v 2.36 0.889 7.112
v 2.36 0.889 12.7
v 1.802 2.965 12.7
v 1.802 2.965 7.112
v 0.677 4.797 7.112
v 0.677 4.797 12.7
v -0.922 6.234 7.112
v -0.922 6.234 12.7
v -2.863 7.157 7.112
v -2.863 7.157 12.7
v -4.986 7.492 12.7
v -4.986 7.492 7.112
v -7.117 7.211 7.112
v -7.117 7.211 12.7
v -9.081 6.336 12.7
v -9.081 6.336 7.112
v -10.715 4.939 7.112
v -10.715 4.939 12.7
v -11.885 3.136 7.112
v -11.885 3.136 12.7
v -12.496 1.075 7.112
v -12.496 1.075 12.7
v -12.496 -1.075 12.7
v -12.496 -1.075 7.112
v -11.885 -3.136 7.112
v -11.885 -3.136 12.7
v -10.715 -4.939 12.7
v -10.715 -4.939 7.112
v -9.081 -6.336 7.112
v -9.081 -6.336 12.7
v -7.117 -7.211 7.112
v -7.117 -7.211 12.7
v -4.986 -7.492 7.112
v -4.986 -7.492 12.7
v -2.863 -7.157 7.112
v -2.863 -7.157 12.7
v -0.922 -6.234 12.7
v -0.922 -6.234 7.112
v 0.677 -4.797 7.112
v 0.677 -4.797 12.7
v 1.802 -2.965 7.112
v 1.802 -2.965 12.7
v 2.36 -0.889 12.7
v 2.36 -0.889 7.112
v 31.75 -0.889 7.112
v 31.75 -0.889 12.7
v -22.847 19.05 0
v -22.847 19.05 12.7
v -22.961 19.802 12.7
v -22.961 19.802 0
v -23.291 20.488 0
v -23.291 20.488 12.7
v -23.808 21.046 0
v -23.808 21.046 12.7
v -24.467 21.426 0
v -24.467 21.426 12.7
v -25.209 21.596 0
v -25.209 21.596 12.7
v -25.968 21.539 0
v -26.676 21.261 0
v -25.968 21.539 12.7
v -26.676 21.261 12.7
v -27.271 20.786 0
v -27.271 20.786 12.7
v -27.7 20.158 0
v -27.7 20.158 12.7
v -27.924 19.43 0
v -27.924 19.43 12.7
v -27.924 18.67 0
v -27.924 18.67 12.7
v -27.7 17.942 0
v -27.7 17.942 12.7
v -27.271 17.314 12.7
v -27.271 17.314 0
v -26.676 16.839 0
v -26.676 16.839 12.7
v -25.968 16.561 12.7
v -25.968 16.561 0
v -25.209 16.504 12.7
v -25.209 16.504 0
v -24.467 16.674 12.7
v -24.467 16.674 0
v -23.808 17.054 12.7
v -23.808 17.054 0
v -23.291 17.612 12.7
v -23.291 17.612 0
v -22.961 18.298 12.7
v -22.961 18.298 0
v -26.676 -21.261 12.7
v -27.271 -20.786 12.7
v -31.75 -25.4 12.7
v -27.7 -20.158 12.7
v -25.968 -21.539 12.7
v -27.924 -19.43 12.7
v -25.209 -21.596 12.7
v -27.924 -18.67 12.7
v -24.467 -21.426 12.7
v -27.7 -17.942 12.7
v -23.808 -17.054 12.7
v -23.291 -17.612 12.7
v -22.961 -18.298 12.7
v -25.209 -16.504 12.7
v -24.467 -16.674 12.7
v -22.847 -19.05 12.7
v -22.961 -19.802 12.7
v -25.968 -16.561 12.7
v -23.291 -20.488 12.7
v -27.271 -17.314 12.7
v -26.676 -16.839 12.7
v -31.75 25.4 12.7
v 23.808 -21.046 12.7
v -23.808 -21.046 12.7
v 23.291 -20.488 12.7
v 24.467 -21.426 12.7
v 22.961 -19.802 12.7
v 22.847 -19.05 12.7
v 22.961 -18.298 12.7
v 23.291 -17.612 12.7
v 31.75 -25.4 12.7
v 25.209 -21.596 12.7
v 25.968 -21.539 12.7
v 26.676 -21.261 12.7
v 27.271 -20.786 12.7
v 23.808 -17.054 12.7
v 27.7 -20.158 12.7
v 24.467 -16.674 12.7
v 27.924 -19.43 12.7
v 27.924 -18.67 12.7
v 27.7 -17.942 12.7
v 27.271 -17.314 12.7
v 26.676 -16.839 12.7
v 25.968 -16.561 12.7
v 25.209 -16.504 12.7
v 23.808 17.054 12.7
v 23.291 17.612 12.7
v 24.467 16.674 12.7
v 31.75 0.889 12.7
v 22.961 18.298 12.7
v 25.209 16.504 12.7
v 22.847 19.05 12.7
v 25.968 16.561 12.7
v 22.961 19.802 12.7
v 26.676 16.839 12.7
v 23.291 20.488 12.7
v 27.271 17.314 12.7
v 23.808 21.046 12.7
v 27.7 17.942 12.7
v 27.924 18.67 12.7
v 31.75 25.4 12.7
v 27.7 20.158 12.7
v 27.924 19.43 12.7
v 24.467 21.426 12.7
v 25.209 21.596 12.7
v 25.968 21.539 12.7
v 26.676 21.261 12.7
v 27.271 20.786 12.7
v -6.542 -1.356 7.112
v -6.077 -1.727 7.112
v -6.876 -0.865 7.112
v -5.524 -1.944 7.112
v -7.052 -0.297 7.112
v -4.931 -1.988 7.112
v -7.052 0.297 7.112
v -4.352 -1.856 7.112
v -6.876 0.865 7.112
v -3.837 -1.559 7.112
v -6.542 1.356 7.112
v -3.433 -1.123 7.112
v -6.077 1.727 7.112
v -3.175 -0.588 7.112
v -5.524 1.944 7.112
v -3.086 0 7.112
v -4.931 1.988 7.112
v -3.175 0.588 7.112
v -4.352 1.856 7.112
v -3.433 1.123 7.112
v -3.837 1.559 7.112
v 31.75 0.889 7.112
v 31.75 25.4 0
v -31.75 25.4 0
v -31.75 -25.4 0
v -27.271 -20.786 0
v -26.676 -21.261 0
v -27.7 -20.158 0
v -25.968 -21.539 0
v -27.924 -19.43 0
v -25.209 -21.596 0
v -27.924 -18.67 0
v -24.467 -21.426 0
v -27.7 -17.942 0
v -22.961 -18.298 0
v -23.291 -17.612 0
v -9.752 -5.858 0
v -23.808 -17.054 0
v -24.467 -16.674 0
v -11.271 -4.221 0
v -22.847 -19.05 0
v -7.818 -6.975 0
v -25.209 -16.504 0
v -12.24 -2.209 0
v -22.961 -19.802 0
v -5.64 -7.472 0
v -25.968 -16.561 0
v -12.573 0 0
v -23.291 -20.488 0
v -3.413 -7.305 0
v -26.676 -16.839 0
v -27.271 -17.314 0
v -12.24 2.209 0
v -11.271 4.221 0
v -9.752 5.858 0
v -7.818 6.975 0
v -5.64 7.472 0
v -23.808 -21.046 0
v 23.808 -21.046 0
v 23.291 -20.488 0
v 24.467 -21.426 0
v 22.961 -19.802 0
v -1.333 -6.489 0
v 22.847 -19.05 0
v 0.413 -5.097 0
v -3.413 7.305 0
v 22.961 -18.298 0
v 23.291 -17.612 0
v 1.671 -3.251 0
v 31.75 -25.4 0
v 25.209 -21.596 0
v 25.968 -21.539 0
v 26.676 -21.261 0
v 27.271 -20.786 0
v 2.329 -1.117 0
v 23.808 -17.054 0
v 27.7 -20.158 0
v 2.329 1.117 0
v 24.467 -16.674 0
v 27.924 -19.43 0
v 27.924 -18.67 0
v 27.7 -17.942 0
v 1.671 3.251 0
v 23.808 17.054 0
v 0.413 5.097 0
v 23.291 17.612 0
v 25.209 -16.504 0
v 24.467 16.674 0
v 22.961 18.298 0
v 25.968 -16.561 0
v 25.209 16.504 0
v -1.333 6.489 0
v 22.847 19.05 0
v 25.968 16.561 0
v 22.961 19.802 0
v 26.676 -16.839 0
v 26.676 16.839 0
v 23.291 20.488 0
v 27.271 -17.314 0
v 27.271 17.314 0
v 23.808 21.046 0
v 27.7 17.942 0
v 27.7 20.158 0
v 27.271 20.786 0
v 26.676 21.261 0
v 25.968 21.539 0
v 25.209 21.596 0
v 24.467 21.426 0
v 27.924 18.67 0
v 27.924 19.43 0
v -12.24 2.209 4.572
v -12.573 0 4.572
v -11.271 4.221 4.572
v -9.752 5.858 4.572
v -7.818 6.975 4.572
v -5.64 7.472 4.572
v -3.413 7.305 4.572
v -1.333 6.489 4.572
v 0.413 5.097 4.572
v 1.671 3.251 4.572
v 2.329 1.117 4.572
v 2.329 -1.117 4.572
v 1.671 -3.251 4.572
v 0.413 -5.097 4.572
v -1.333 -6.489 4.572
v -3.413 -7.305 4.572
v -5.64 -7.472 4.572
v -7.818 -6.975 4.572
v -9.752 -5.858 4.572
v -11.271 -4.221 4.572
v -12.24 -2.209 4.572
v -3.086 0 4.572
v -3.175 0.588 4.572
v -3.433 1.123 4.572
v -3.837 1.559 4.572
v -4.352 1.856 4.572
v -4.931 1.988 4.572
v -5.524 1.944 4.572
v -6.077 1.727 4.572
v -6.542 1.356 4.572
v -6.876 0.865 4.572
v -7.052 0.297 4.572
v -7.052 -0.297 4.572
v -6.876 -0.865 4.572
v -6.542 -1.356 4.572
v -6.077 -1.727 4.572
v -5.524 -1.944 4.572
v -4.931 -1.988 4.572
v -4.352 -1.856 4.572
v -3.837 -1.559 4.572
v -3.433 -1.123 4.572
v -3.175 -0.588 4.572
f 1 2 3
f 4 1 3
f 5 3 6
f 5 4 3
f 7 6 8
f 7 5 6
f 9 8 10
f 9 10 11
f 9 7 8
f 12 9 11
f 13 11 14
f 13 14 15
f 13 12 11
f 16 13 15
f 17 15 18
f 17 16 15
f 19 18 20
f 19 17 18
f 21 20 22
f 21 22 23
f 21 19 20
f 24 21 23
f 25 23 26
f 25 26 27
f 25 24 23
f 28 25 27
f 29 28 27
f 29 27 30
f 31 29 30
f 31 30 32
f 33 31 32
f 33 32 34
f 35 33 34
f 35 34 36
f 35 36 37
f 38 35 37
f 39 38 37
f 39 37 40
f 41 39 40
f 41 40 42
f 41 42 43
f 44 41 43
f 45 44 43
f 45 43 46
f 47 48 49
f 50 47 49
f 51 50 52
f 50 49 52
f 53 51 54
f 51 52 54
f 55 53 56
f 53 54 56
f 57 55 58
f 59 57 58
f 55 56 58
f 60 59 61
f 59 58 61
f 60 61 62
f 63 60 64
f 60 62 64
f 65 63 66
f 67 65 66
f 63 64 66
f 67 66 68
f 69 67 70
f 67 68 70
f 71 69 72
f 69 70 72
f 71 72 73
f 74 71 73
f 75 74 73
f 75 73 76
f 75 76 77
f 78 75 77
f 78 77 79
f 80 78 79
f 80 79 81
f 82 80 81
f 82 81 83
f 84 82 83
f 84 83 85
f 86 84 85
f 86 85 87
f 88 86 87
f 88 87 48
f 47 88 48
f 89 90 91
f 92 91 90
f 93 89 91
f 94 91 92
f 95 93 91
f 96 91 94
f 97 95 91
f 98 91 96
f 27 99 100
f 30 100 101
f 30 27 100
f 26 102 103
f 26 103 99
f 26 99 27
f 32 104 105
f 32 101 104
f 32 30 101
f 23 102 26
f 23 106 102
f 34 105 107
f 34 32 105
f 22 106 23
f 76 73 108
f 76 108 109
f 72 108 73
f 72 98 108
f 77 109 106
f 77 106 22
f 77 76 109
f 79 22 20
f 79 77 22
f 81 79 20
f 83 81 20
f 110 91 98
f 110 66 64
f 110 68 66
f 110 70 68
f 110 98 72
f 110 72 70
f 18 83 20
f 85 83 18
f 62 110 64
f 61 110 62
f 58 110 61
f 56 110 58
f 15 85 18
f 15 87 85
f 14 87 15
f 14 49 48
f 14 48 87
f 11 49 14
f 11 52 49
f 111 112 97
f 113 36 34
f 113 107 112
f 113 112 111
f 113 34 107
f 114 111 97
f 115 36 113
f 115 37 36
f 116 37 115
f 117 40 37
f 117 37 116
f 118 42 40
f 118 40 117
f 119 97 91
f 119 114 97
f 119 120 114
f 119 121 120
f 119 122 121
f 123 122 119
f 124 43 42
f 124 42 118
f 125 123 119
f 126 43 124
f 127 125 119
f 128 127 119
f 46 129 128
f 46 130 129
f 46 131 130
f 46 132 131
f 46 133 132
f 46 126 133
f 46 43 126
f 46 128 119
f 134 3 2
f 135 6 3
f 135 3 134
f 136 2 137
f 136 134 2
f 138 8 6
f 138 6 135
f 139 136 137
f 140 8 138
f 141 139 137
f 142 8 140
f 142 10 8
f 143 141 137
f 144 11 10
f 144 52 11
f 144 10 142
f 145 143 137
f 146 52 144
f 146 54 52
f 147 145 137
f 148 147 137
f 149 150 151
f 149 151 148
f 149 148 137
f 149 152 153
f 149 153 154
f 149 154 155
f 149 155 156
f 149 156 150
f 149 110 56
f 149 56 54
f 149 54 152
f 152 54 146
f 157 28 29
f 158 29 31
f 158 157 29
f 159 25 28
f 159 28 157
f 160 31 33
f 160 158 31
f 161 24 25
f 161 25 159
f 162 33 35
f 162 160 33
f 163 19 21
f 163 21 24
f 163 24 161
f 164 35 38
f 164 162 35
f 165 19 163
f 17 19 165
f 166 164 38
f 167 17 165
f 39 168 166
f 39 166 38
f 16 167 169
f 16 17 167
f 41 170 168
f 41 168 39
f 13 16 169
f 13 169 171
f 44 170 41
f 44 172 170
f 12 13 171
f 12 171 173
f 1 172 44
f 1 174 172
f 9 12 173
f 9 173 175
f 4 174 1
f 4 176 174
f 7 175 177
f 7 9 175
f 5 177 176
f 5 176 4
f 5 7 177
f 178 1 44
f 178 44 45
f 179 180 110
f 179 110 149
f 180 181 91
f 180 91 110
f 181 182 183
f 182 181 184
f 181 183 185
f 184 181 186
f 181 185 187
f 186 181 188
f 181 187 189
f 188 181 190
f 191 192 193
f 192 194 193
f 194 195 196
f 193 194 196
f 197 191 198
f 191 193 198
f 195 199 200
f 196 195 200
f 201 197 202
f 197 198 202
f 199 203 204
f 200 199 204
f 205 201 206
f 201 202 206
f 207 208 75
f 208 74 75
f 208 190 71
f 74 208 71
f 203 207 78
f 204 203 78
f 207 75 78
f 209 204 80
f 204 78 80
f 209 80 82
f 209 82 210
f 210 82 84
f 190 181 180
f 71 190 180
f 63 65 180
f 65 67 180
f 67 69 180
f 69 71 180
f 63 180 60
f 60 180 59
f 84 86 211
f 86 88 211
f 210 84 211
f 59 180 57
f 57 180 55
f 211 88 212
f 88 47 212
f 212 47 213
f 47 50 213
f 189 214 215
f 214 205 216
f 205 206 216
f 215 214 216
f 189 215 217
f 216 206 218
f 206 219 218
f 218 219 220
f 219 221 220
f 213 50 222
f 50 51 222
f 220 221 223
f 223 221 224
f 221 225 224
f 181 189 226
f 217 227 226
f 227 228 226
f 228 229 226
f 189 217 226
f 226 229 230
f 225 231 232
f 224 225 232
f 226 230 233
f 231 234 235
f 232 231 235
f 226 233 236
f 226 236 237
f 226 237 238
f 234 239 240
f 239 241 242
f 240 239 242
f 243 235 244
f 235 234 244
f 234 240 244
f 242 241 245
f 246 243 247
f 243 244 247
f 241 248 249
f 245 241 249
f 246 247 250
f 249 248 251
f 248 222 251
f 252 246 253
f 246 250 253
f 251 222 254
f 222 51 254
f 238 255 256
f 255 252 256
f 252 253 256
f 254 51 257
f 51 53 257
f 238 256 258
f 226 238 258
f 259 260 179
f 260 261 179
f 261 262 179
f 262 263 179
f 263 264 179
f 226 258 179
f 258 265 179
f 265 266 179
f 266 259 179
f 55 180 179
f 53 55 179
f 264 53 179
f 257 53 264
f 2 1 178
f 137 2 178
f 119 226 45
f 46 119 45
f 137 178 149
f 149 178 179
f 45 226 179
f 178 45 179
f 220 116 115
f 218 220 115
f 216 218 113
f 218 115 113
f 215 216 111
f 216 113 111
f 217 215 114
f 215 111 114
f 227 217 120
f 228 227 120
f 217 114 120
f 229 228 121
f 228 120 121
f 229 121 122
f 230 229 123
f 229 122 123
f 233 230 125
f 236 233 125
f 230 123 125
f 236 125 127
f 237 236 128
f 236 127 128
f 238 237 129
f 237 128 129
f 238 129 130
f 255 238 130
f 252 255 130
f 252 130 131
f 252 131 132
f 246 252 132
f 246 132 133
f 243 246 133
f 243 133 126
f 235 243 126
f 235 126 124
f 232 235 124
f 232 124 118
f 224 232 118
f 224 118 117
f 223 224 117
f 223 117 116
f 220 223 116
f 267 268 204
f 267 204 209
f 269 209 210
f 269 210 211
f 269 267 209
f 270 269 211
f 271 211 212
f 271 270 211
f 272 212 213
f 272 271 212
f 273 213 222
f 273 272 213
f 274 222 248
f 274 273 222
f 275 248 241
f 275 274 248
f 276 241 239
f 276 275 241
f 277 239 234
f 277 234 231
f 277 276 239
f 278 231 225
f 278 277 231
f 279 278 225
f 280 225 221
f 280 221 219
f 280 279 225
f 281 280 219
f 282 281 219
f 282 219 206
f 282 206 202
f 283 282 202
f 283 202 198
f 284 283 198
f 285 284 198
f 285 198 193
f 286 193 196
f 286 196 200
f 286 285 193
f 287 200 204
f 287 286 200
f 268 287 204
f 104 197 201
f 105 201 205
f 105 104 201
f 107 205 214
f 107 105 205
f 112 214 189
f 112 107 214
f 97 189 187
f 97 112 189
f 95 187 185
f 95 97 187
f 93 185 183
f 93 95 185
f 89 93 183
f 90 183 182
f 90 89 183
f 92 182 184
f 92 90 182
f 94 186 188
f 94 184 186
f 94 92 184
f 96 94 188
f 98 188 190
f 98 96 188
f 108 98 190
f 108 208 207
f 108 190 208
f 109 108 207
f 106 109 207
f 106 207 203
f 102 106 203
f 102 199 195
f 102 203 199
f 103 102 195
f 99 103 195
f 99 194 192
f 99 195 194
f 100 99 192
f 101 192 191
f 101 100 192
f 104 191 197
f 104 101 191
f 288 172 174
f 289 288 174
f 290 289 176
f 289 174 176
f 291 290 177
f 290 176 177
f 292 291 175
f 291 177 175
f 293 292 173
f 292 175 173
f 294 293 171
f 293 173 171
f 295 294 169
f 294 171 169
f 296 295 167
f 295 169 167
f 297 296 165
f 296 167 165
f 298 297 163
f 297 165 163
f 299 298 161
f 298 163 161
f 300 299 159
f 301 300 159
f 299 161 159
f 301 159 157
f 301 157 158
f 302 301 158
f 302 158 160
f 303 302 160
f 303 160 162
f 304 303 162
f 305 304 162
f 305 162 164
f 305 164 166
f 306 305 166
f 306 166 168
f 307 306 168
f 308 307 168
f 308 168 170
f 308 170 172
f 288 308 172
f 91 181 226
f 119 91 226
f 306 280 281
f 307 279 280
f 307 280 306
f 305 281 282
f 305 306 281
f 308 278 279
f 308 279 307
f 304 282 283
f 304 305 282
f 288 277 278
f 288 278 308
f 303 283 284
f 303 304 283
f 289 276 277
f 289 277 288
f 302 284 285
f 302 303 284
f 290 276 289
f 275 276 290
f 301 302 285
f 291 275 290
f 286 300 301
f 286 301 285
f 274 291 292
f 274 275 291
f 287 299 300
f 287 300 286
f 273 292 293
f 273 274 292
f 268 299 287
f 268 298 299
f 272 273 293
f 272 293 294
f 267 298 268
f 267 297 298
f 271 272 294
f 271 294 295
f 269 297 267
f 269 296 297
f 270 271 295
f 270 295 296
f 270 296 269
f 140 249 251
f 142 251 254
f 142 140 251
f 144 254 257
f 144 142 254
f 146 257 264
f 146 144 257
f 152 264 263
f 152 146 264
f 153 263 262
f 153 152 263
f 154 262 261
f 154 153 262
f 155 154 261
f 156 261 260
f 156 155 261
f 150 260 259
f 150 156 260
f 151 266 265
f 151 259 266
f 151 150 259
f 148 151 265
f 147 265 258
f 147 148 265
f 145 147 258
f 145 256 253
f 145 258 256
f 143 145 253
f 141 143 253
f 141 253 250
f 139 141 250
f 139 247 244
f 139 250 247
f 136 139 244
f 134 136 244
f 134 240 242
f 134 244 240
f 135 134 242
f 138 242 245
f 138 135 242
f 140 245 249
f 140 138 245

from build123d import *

# Parameters (mm, degrees)
SKETCH1_W               = 63.5
SKETCH1_H               = 50.8
BOSS_EXTRUDE1_DEPTH     = 12.7
CUT_EXTRUDE1_START      = -5.588
SKETCH2_R               = 7.493
CUT_EXTRUDE1_DEPTH      = 5.588
CUT_EXTRUDE2_START      = -5.588
SKETCH3_W               = 31.75
SKETCH3_H               = 1.778
CUT_EXTRUDE2_DEPTH      = 5.588
SKETCH9_R               = 1.9939
CUT_EXTRUDE3_DEPTH      = 11.9888
CUT_EXTRUDE4_START      = -4.572
SKETCH10_R              = 7.493
CUT_EXTRUDE4_DEPTH      = 4.572
SKETCH11_R              = 2.5527
CUT_EXTRUDE5_DEPTH      = 13.7
MIRROR2_COPY_1_SKETCH_R = 2.5527
MIRROR2_COPY_1_DEPTH    = 13.7


with BuildPart() as part:
    # Sketch1 → Boss-Extrude1 (new body)
    with BuildSketch(Plane.XY):
        Rectangle(SKETCH1_W, SKETCH1_H)
    extrude(amount=BOSS_EXTRUDE1_DEPTH)

    # Sketch2 → Cut-Extrude1 (cut)
    with BuildSketch(Plane.XY.offset(12.7).offset(CUT_EXTRUDE1_START)):
        with Locations((-5.08, 0)):
            Circle(SKETCH2_R)
    extrude(amount=CUT_EXTRUDE1_DEPTH, mode=Mode.SUBTRACT)

    # Sketch3 → Cut-Extrude2 (cut)
    with BuildSketch(Plane.XY.offset(12.7).offset(CUT_EXTRUDE2_START)):
        with Locations((15.875, 0)):
            Rectangle(SKETCH3_W, SKETCH3_H)
    extrude(amount=CUT_EXTRUDE2_DEPTH, mode=Mode.SUBTRACT)

    # Sketch9 → Cut-Extrude3 (cut)
    with BuildSketch(Plane.XY.offset(7.112)):
        with Locations((-5.08, 0)):
            Circle(SKETCH9_R)
    extrude(amount=-CUT_EXTRUDE3_DEPTH, mode=Mode.SUBTRACT)

    # Sketch10 → Cut-Extrude4 (cut)
    with BuildSketch(Plane(origin=(0, 0, 0), x_dir=(-1, 0, 0), z_dir=(0, 0, -1)).offset(CUT_EXTRUDE4_START)):
        with Locations((5.08, 0)):
            Circle(SKETCH10_R)
    extrude(amount=CUT_EXTRUDE4_DEPTH, mode=Mode.SUBTRACT)

    # Sketch11 → Cut-Extrude5 (cut, through all)
    with BuildSketch(Plane.XY.offset(12.7)):
        with Locations((-25.4, 19.05)):
            Circle(SKETCH11_R)
    cut_extrude5 = extrude(amount=-CUT_EXTRUDE5_DEPTH, mode=Mode.SUBTRACT)

    # Mirror1: Cut-Extrude5 across plane
    add(cut_extrude5.mirror(Plane(origin=(0, 0, 0), x_dir=(0, 0, 1), z_dir=(1, 0, 0))), mode=Mode.SUBTRACT)

    # Mirror2: Cut-Extrude5 across plane
    add(cut_extrude5.mirror(Plane.ZX), mode=Mode.SUBTRACT)

    # Mirror2 copy 1 sketch → Mirror2 copy 1 (cut, through all)
    with BuildSketch(Plane(origin=(0, 0, 12.7), x_dir=(-1, 0, 0), z_dir=(0, 0, 1))):
        with Locations((-25.4, 19.05)):
            Circle(MIRROR2_COPY_1_SKETCH_R)
    extrude(amount=-MIRROR2_COPY_1_DEPTH, mode=Mode.SUBTRACT)


solid = part.part
